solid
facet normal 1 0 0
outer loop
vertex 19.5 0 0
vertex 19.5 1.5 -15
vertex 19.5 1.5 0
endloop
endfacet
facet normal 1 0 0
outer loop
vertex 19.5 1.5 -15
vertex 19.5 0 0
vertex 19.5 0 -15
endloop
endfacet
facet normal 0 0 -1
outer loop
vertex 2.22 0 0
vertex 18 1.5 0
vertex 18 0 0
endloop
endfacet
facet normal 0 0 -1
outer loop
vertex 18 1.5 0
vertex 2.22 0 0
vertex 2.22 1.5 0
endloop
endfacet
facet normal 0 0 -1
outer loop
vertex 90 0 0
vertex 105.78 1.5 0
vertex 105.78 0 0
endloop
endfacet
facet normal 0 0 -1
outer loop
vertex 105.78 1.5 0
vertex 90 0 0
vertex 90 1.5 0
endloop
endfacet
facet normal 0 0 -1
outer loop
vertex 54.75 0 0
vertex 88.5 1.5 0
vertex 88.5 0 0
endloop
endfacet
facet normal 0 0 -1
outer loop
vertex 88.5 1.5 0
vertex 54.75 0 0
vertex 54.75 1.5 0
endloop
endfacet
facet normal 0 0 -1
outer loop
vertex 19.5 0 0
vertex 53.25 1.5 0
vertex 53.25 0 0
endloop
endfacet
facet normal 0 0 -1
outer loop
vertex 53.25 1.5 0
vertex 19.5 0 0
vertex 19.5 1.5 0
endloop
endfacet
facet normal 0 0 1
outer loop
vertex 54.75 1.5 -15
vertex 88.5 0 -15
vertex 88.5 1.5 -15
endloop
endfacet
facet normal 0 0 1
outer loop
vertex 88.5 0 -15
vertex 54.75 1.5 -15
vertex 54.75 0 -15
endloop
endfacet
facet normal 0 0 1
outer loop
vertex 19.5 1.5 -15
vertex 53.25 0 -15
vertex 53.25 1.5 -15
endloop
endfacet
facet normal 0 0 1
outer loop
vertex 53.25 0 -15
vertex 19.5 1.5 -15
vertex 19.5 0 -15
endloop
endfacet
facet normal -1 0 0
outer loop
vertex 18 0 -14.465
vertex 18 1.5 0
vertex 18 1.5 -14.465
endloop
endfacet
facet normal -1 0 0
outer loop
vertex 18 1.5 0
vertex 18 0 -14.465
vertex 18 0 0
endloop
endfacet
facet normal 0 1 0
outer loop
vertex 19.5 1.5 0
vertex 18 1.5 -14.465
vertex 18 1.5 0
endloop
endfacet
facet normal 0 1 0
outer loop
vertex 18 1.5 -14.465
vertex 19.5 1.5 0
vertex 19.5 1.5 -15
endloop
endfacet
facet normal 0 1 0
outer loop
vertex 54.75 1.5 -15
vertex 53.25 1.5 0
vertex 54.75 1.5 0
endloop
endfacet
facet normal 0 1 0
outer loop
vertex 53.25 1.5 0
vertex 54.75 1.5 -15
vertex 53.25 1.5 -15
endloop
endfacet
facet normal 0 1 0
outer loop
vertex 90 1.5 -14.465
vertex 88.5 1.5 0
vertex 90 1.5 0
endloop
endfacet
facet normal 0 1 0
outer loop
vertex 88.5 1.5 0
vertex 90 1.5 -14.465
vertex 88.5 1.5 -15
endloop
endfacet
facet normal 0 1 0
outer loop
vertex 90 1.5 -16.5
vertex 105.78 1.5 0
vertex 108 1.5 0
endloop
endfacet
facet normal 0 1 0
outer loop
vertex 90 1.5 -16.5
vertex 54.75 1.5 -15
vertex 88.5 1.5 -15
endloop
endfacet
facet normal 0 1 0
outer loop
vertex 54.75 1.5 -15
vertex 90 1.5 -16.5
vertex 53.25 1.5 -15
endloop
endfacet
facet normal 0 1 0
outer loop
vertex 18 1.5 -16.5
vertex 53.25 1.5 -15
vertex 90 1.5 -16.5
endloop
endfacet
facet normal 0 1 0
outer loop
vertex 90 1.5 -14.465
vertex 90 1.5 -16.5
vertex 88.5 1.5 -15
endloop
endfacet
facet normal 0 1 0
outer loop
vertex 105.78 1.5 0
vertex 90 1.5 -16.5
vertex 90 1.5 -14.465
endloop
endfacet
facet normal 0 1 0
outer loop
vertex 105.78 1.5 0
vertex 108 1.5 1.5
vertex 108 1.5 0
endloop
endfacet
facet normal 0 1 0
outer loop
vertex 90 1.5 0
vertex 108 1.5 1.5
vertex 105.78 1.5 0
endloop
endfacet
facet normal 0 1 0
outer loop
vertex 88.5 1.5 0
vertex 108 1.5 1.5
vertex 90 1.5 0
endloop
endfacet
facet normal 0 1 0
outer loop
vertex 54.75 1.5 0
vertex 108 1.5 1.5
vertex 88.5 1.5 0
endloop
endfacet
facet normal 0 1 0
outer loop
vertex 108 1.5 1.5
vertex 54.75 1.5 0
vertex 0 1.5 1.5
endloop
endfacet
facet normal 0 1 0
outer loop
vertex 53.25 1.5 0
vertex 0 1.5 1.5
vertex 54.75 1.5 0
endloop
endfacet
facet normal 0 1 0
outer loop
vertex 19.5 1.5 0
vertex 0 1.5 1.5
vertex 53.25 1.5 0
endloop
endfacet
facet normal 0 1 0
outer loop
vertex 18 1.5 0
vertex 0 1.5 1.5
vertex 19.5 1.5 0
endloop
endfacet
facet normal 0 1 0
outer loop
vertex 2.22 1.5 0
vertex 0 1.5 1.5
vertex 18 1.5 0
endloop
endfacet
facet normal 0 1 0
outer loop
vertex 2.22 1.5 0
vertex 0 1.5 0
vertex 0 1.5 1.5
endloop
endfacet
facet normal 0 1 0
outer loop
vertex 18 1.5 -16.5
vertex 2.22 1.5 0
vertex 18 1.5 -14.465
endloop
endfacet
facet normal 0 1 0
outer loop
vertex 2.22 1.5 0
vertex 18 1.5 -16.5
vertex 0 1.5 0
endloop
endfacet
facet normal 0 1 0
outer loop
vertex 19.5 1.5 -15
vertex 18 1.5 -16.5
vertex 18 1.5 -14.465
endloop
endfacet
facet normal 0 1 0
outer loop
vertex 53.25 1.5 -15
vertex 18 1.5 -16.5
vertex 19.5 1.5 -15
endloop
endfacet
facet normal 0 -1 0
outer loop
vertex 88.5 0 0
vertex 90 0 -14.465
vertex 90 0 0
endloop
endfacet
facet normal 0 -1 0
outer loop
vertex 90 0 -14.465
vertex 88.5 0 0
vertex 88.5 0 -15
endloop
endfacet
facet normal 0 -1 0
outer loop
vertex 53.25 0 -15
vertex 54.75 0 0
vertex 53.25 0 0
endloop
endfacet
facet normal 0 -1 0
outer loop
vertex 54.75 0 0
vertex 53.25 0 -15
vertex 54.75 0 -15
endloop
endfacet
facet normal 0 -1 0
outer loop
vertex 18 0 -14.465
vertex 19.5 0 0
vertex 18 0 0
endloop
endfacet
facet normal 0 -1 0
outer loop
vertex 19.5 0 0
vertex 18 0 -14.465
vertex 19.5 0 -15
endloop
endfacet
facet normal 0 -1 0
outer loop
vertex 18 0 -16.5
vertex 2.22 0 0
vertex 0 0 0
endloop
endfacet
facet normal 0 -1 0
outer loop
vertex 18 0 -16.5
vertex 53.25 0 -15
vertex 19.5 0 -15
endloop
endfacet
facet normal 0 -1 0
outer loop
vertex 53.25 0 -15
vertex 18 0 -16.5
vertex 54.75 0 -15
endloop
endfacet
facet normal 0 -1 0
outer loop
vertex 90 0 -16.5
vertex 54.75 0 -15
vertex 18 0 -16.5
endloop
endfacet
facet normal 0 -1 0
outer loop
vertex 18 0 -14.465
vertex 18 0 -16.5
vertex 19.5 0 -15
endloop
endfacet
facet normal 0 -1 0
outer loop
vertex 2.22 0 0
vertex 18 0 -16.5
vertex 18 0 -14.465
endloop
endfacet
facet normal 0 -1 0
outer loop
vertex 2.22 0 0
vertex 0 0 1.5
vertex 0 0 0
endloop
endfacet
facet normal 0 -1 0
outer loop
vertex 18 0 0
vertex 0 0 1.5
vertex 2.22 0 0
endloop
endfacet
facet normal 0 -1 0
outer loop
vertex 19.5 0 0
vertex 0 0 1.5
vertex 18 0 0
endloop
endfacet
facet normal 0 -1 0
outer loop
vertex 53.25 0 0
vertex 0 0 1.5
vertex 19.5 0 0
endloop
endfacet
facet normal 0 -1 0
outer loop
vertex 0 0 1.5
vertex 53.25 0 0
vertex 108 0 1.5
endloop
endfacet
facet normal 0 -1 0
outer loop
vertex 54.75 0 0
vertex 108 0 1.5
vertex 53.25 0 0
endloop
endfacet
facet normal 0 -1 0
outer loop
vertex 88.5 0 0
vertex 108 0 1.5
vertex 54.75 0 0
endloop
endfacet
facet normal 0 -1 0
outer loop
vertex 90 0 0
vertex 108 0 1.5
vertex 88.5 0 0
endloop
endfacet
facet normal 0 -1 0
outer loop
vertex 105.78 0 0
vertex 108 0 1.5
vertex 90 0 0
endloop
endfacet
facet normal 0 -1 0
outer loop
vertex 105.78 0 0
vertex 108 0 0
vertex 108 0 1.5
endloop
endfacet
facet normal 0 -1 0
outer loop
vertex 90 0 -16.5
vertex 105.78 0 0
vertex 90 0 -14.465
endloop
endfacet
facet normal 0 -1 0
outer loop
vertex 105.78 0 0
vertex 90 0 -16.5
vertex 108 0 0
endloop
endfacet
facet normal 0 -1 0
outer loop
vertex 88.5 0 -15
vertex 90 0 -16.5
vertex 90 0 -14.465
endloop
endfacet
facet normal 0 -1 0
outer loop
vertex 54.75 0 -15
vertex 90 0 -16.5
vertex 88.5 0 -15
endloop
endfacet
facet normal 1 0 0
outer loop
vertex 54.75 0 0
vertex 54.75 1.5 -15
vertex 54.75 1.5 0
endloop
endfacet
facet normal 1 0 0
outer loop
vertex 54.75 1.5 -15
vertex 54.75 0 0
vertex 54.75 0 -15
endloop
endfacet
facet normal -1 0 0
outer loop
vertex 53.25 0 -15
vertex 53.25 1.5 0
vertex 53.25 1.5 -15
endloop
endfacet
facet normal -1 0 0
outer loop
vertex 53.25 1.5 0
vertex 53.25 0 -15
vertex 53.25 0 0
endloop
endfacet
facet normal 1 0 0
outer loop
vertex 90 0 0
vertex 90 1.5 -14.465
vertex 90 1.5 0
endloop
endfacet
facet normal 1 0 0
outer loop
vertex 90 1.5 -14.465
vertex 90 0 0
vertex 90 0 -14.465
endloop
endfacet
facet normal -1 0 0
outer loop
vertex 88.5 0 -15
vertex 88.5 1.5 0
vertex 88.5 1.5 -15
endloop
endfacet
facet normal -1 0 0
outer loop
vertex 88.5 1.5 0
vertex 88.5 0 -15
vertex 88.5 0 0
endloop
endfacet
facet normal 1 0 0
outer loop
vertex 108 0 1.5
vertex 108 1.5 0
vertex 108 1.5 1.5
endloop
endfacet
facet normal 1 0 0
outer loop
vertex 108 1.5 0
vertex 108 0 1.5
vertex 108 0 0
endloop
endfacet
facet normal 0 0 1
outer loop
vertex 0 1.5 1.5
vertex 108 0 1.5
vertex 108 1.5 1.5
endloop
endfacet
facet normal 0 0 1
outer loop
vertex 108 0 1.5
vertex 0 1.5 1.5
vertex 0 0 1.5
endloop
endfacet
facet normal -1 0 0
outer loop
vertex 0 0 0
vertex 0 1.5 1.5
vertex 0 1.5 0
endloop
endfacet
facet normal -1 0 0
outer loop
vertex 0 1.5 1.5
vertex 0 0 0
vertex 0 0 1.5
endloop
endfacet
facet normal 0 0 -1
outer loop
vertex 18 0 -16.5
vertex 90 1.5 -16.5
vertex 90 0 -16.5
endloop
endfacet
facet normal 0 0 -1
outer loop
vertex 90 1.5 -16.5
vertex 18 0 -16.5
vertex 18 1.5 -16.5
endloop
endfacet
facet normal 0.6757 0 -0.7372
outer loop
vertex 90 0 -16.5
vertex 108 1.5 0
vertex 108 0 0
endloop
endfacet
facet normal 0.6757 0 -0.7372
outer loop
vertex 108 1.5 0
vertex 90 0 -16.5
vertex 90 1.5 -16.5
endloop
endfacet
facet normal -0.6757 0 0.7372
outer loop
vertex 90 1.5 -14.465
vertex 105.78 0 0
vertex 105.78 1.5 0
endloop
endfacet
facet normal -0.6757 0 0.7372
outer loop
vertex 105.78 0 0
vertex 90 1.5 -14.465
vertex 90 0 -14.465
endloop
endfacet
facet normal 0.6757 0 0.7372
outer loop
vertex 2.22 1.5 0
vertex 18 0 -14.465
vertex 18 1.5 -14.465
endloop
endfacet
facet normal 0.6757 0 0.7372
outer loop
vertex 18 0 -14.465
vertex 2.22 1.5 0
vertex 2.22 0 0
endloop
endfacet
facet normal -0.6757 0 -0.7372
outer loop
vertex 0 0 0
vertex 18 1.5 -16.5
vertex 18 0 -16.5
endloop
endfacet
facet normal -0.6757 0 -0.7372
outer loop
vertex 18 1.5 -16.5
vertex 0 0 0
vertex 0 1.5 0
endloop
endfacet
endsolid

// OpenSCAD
module pontoon(length=108, height=18, foam_vis=false, foam_board_thickness=2, board_number=1, n_vert=3, side="port") {
	//// VARIABLES ////

	function b1()=0.5; //One-by-one
	function b2()=1.5; //One-by-one
	b1=.5;
	b2=1.5;
	b4=3.5;
	b8=7.5;
	plywood_thickness=.5;
	bottom_length=length-height*2-b2();
	bottom_x=bottom_length/(n_vert-1);
	xy=[height, height-b2()];
	//echo(xy[0]);echo(xy[1]);
	hyp=sqrt((xy[0]*xy[0])+(xy[1]*xy[1]));
	angle=atan2(xy[0],xy[1]);
	echo(angle);
	//echo(hyp);

	//// GENERATION CODE ////

	color("BurlyWood", 1.0){ // This color represents softwood.

		// TOP SUPPORT //
		cube([length,b2(),b2()]);

		// VERTICAL SUPPORTS //
		for(i = [0:n_vert-1]){
			translate([height+bottom_x*i,0,0]){
				translate([0,0,-height+b2()*2])
					cube([b2(),b2(),height-b2()*2]);
				/*// CORNER SUPPORTS
				  translate([0,0,-b8+b2]){
				  if(side=="starboard" || side=="right"){
				  translate([0,b2,0])
				  cube([b2,b4,b8]);
				//echo("It's starboard!");
				}
				else if(side=="port" || side == "left"){
				translate([0,-b4,0])
				cube([b2,b4,b8]);
				}
				}*/
			}
		}

		// BOTTOM SUPPORT //
		translate([height,0,-height+b2()])
			cube([bottom_length+b2(),b2(),b2()]);

		// FRONT SUPPORT //
		/*translate([bottom_length+height*1.5,b2()/2,-height/2+b2()])
		  rotate([0,angle,0])
		  cube([b2(),b2(),hyp], center=true);*/
		translate([length,0,0])mirror([1,0,0])
			translate([height,0,-height+b2()])
			rotate([0,-angle,0])
			cube([b2(),b2(),hyp]);//,center=true);

		// REAR SUPPORT //
		translate([height,0,-height+b2()])
			rotate([0,-angle,0])
			cube([b2(),b2(),hyp]);//,center=true);
	}

	// FOAM //
	if(foam_vis==true){
		color("Pink", 1.0){
			difference(){
				for(i=[b2(),-board_number*foam_board_thickness]){
					translate([0,i,-height+b2()])
						cube([length,foam_board_thickness*board_number,height]);
				}
				for(i=[false,true]){
					translate([-b2()/2,0,-hyp+b2()/2])
						rotate([0,-angle,0])
						cube(height*2, center=true);
					if(i==true){
						translate([length,0,0])mirror([1,0,0])
							translate([-b2()/2,0,-hyp+b2()/2])
							rotate([0,-angle,0])
							cube(height*2, center=true);
					}
				}
			}
		}
	}
}
pontoon();
